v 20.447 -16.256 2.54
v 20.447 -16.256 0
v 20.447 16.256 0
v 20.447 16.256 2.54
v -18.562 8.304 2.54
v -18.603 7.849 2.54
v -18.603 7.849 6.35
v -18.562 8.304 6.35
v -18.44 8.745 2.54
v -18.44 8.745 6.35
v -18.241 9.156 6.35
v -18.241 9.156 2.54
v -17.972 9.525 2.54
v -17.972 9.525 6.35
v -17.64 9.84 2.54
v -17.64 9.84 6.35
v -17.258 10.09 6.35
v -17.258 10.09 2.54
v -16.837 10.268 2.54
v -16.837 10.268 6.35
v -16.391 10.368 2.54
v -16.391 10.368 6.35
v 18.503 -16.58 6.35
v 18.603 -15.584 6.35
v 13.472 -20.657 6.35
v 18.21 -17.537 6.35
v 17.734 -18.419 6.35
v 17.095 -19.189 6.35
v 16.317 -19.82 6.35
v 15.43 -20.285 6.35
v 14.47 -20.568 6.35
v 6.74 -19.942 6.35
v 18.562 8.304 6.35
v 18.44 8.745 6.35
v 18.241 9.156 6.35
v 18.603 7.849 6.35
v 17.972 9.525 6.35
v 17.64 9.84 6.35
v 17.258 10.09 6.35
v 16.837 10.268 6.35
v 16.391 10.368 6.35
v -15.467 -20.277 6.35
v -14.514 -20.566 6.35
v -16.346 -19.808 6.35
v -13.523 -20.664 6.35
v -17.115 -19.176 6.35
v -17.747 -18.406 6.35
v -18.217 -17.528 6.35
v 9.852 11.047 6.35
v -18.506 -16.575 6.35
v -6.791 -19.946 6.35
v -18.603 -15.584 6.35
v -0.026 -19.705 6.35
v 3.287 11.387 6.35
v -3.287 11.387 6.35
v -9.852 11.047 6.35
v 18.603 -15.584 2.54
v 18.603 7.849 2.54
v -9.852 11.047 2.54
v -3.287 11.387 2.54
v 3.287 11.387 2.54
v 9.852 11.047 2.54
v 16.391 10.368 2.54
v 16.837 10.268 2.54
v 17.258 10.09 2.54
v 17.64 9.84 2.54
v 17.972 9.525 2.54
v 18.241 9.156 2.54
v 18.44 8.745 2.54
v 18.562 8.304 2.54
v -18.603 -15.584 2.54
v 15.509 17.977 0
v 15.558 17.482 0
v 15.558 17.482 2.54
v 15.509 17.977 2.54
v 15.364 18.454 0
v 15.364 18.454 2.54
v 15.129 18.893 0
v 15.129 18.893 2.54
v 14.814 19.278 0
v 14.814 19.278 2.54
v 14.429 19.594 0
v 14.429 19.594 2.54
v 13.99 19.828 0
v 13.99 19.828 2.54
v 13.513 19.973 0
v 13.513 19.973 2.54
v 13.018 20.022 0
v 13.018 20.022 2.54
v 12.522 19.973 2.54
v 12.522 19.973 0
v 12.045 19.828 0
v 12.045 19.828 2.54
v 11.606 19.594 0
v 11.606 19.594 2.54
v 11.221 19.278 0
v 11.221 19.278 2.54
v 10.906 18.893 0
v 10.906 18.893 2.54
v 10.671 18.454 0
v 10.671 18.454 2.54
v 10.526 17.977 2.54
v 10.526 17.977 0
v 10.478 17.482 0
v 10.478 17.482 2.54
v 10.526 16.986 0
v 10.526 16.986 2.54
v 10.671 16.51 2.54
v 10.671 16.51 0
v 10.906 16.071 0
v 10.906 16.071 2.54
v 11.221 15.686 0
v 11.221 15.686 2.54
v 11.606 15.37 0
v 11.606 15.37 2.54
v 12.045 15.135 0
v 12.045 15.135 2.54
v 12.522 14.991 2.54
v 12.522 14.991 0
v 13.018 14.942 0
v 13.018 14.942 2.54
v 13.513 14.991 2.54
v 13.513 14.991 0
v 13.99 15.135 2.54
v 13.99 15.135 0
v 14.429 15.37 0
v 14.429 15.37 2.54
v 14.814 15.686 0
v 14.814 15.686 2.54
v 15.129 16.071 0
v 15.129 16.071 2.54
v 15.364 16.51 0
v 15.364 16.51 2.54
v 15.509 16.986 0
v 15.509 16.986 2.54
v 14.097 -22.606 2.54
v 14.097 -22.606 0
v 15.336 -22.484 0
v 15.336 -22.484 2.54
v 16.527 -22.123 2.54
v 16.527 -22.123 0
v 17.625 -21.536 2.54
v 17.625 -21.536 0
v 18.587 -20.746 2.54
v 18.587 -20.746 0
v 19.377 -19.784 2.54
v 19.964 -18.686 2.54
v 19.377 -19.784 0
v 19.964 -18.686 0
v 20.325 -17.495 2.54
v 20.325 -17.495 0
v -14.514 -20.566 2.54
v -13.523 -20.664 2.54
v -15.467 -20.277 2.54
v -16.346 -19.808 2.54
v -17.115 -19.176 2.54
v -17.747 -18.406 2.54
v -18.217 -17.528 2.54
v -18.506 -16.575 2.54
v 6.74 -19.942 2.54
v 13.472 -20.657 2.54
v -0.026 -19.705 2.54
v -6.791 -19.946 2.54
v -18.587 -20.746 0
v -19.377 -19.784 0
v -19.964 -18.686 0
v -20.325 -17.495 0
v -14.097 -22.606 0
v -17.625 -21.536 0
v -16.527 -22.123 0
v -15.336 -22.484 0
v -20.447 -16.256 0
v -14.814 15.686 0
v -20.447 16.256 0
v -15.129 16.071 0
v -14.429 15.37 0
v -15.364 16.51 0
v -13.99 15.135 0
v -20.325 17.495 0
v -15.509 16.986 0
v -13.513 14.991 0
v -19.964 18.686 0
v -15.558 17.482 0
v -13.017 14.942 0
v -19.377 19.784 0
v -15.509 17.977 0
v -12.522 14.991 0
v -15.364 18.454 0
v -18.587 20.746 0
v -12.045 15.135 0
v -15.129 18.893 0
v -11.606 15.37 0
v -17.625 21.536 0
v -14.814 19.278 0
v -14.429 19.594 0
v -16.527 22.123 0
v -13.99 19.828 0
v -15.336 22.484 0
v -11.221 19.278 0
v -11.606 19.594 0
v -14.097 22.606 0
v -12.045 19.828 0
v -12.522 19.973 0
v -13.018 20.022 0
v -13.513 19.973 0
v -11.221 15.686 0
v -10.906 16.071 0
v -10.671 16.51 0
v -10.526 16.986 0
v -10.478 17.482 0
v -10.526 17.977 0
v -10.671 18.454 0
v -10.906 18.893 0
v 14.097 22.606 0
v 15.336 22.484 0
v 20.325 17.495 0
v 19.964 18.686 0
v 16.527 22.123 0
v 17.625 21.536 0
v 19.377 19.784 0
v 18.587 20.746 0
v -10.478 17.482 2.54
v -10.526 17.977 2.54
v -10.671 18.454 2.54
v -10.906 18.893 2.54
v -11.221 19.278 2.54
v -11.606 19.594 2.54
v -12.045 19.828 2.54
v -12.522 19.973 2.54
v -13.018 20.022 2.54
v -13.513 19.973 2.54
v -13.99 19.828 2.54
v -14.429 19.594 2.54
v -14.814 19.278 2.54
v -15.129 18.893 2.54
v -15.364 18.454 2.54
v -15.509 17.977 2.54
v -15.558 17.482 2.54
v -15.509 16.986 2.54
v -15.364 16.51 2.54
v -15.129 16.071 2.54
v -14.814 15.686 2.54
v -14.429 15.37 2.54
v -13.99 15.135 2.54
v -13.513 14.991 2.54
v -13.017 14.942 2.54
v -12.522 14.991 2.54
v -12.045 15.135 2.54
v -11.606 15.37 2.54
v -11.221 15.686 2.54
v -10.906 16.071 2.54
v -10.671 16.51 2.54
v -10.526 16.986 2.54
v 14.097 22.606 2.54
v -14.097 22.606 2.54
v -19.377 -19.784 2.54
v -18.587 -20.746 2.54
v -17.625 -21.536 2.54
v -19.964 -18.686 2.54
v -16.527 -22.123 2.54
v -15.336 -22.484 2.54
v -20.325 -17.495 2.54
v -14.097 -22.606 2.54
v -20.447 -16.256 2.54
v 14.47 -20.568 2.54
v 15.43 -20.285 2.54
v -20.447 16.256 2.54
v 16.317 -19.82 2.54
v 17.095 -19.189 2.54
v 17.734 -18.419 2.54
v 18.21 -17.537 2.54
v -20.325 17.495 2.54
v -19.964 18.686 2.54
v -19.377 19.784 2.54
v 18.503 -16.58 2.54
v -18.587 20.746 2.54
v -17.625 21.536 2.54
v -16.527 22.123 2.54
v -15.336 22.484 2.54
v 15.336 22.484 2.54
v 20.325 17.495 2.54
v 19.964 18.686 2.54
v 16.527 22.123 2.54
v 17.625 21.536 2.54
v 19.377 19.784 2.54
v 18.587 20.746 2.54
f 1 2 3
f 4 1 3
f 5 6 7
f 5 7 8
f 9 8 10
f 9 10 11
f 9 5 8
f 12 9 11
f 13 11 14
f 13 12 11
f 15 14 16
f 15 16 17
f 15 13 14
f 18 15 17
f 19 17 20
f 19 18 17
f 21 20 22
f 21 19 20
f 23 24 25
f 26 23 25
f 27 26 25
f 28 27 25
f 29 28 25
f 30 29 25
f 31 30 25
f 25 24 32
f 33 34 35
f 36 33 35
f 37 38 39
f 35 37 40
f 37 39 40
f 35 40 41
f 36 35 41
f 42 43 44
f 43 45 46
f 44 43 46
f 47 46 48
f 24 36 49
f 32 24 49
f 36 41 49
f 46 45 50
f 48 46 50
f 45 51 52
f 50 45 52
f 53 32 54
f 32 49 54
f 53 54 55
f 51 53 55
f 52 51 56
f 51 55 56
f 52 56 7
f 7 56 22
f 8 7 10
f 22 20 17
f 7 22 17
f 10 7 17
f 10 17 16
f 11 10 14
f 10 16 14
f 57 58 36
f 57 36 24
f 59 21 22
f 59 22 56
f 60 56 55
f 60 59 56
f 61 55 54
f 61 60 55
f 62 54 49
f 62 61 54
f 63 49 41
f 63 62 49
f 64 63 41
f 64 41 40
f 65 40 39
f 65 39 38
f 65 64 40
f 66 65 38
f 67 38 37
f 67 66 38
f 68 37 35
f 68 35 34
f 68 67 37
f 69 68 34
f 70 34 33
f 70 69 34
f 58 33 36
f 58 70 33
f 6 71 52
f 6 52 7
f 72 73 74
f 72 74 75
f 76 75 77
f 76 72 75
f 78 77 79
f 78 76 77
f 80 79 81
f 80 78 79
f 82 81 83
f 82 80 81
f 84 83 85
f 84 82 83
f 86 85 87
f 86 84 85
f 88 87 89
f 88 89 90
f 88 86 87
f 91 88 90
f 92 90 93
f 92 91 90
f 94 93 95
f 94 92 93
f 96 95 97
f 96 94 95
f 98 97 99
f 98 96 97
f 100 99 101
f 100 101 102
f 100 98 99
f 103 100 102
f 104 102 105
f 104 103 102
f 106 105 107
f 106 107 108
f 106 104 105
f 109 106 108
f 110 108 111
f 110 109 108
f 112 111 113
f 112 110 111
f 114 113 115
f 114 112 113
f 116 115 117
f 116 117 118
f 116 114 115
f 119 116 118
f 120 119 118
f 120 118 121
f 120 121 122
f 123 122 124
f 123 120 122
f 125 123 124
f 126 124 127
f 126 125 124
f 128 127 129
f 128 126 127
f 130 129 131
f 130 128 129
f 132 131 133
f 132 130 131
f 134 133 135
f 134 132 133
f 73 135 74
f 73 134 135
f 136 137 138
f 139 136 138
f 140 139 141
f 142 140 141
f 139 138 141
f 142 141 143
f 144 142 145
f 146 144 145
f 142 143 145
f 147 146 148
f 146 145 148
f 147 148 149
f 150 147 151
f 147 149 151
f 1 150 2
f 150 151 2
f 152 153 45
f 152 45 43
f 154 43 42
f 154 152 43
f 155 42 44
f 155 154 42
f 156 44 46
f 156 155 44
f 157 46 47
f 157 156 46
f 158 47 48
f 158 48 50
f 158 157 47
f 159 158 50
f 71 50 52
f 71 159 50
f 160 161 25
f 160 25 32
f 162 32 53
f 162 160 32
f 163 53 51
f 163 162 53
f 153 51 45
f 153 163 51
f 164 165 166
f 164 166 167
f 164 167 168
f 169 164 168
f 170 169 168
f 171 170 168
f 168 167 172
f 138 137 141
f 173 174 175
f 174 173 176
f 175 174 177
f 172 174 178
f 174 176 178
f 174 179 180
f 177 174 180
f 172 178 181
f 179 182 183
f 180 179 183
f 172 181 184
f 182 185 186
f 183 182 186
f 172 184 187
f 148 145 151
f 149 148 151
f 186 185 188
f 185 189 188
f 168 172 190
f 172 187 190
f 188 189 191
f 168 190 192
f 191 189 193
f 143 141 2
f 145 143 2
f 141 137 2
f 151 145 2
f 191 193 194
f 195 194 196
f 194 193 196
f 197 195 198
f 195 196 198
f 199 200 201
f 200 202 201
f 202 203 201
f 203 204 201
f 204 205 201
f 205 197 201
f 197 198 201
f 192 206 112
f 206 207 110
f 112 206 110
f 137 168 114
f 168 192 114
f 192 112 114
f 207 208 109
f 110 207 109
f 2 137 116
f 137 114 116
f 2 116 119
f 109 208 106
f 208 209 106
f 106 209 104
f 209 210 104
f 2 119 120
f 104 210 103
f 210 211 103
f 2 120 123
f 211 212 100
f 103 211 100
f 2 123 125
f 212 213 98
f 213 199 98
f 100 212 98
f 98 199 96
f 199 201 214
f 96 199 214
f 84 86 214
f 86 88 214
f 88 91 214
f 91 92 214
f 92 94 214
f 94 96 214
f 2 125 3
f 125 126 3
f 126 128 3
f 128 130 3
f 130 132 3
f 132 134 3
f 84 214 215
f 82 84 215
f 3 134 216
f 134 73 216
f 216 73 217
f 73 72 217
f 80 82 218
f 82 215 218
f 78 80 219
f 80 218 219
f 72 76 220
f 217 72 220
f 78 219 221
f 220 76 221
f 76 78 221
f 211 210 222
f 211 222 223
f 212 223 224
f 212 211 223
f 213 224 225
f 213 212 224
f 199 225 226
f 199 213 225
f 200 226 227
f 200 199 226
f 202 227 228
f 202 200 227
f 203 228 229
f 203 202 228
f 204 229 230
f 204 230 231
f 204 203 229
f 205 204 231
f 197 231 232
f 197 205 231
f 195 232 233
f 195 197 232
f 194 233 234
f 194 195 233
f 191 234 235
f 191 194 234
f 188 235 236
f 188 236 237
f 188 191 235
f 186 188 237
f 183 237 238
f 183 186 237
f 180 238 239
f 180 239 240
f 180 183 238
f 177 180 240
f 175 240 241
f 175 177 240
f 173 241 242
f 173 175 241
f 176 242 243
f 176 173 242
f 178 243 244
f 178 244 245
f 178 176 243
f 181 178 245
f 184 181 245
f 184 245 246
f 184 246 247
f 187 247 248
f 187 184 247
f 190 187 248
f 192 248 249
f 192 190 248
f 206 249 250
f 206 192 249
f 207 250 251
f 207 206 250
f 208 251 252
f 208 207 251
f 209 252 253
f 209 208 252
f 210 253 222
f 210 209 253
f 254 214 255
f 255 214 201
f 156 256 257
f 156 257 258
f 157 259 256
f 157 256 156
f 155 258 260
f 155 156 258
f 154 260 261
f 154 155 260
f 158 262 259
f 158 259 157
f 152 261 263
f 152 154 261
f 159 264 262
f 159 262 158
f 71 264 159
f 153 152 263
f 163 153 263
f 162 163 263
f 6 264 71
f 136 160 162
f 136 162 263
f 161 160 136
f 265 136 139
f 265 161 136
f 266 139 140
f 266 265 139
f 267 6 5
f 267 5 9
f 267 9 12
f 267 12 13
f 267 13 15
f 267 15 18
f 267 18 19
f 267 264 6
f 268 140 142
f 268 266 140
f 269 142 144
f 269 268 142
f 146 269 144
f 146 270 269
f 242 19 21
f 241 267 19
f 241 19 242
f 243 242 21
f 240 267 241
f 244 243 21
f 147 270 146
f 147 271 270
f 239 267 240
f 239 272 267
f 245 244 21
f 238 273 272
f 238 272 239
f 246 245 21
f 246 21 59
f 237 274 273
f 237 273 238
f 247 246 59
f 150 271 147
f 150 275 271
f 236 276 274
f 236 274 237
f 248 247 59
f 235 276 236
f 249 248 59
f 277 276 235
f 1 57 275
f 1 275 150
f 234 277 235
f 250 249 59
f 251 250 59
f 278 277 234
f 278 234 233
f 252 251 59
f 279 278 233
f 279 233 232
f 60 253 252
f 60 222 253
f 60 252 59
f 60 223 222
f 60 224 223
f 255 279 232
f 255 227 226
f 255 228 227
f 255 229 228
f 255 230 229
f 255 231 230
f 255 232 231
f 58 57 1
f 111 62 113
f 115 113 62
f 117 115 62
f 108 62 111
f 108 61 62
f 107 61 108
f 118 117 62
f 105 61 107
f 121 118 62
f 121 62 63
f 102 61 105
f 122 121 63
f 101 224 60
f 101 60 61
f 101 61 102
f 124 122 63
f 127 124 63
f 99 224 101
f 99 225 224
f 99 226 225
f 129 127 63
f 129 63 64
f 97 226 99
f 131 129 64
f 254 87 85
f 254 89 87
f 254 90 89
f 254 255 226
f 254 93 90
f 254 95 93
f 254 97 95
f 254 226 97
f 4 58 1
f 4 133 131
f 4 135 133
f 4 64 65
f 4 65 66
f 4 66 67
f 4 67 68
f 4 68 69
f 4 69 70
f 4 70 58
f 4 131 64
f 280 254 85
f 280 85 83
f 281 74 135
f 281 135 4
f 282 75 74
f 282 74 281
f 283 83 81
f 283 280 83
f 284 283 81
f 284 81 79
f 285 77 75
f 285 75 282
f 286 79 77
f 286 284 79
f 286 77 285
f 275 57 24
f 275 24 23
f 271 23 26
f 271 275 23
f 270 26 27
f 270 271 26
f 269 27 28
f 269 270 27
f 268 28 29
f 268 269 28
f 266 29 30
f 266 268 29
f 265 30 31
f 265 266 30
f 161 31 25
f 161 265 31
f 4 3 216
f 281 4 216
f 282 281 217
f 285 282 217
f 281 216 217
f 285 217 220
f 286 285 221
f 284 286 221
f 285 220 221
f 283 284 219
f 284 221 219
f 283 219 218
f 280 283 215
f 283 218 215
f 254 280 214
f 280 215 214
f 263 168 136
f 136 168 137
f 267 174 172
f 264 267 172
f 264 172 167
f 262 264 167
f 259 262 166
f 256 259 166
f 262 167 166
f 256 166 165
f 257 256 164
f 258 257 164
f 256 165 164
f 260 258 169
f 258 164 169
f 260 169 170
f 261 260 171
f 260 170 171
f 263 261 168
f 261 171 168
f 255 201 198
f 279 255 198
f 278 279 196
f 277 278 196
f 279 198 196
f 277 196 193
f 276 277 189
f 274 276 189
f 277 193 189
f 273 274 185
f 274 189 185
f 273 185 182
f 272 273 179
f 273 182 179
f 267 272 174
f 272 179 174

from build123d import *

# Parameters (mm, degrees)
SKETCH1_R           = 2.54
BOSS_EXTRUDE1_DEPTH = 2.54
BOSS_EXTRUDE2_DEPTH = 3.81


with BuildPart() as part:
    # Sketch1 → Boss-Extrude1 (new body)
    with BuildSketch(Plane.XY):
        with BuildLine():
            Line((-14.097, -22.606), (14.097, -22.606))
            ThreePointArc((14.097, -22.606), (18.587128061, -20.746128061), (20.447, -16.256))
            Line((20.447, -16.256), (20.447, 16.256))
            ThreePointArc((20.447, 16.256), (18.587128061, 20.746128061), (14.097, 22.606))
            Line((14.097, 22.606), (-14.097, 22.606))
            ThreePointArc((-14.097, 22.606), (-18.587128061, 20.746128061), (-20.447, 16.256))
            Line((-20.447, 16.256), (-20.447, -16.256))
            ThreePointArc((-20.447, -16.256), (-18.587128061, -20.746128061), (-14.097, -22.606))
        make_face()
        with Locations((13.0175, 17.481804688)):
            Circle(SKETCH1_R, mode=Mode.SUBTRACT)
        with Locations((-13.0175, 17.481804688)):
            Circle(SKETCH1_R, mode=Mode.SUBTRACT)
    extrude(amount=BOSS_EXTRUDE1_DEPTH)

    # Sketch2 → Boss-Extrude2 (add)
    with BuildSketch(Plane.XY.offset(2.54)):
        with BuildLine():
            Line((-18.603310345, -15.583823179), (-18.603310345, 7.849049019))
            ThreePointArc((-18.603310345, 7.849049019), (-17.97174813, 9.525194962), (-16.391133005, 10.367805121))
            ThreePointArc((-16.391133005, 10.367805121), (0, 11.43), (16.391133005, 10.367805121))
            ThreePointArc((16.391133005, 10.367805121), (17.97174813, 9.525194962), (18.603310345, 7.849049019))
            Line((18.603310345, 7.849049019), (18.603310345, -15.583823179))
            ThreePointArc((18.603310345, -15.583823179), (17.094874343, -19.189362325), (13.472365536, -20.656577934))
            ThreePointArc((13.472365536, -20.656577934), (-0.025728715, -19.705190714), (-13.523310345, -20.663823179))
            ThreePointArc((-13.523310345, -20.663823179), (-17.115412793, -19.175925628), (-18.603310345, -15.583823179))
        make_face()
    extrude(amount=BOSS_EXTRUDE2_DEPTH)


solid = part.part
